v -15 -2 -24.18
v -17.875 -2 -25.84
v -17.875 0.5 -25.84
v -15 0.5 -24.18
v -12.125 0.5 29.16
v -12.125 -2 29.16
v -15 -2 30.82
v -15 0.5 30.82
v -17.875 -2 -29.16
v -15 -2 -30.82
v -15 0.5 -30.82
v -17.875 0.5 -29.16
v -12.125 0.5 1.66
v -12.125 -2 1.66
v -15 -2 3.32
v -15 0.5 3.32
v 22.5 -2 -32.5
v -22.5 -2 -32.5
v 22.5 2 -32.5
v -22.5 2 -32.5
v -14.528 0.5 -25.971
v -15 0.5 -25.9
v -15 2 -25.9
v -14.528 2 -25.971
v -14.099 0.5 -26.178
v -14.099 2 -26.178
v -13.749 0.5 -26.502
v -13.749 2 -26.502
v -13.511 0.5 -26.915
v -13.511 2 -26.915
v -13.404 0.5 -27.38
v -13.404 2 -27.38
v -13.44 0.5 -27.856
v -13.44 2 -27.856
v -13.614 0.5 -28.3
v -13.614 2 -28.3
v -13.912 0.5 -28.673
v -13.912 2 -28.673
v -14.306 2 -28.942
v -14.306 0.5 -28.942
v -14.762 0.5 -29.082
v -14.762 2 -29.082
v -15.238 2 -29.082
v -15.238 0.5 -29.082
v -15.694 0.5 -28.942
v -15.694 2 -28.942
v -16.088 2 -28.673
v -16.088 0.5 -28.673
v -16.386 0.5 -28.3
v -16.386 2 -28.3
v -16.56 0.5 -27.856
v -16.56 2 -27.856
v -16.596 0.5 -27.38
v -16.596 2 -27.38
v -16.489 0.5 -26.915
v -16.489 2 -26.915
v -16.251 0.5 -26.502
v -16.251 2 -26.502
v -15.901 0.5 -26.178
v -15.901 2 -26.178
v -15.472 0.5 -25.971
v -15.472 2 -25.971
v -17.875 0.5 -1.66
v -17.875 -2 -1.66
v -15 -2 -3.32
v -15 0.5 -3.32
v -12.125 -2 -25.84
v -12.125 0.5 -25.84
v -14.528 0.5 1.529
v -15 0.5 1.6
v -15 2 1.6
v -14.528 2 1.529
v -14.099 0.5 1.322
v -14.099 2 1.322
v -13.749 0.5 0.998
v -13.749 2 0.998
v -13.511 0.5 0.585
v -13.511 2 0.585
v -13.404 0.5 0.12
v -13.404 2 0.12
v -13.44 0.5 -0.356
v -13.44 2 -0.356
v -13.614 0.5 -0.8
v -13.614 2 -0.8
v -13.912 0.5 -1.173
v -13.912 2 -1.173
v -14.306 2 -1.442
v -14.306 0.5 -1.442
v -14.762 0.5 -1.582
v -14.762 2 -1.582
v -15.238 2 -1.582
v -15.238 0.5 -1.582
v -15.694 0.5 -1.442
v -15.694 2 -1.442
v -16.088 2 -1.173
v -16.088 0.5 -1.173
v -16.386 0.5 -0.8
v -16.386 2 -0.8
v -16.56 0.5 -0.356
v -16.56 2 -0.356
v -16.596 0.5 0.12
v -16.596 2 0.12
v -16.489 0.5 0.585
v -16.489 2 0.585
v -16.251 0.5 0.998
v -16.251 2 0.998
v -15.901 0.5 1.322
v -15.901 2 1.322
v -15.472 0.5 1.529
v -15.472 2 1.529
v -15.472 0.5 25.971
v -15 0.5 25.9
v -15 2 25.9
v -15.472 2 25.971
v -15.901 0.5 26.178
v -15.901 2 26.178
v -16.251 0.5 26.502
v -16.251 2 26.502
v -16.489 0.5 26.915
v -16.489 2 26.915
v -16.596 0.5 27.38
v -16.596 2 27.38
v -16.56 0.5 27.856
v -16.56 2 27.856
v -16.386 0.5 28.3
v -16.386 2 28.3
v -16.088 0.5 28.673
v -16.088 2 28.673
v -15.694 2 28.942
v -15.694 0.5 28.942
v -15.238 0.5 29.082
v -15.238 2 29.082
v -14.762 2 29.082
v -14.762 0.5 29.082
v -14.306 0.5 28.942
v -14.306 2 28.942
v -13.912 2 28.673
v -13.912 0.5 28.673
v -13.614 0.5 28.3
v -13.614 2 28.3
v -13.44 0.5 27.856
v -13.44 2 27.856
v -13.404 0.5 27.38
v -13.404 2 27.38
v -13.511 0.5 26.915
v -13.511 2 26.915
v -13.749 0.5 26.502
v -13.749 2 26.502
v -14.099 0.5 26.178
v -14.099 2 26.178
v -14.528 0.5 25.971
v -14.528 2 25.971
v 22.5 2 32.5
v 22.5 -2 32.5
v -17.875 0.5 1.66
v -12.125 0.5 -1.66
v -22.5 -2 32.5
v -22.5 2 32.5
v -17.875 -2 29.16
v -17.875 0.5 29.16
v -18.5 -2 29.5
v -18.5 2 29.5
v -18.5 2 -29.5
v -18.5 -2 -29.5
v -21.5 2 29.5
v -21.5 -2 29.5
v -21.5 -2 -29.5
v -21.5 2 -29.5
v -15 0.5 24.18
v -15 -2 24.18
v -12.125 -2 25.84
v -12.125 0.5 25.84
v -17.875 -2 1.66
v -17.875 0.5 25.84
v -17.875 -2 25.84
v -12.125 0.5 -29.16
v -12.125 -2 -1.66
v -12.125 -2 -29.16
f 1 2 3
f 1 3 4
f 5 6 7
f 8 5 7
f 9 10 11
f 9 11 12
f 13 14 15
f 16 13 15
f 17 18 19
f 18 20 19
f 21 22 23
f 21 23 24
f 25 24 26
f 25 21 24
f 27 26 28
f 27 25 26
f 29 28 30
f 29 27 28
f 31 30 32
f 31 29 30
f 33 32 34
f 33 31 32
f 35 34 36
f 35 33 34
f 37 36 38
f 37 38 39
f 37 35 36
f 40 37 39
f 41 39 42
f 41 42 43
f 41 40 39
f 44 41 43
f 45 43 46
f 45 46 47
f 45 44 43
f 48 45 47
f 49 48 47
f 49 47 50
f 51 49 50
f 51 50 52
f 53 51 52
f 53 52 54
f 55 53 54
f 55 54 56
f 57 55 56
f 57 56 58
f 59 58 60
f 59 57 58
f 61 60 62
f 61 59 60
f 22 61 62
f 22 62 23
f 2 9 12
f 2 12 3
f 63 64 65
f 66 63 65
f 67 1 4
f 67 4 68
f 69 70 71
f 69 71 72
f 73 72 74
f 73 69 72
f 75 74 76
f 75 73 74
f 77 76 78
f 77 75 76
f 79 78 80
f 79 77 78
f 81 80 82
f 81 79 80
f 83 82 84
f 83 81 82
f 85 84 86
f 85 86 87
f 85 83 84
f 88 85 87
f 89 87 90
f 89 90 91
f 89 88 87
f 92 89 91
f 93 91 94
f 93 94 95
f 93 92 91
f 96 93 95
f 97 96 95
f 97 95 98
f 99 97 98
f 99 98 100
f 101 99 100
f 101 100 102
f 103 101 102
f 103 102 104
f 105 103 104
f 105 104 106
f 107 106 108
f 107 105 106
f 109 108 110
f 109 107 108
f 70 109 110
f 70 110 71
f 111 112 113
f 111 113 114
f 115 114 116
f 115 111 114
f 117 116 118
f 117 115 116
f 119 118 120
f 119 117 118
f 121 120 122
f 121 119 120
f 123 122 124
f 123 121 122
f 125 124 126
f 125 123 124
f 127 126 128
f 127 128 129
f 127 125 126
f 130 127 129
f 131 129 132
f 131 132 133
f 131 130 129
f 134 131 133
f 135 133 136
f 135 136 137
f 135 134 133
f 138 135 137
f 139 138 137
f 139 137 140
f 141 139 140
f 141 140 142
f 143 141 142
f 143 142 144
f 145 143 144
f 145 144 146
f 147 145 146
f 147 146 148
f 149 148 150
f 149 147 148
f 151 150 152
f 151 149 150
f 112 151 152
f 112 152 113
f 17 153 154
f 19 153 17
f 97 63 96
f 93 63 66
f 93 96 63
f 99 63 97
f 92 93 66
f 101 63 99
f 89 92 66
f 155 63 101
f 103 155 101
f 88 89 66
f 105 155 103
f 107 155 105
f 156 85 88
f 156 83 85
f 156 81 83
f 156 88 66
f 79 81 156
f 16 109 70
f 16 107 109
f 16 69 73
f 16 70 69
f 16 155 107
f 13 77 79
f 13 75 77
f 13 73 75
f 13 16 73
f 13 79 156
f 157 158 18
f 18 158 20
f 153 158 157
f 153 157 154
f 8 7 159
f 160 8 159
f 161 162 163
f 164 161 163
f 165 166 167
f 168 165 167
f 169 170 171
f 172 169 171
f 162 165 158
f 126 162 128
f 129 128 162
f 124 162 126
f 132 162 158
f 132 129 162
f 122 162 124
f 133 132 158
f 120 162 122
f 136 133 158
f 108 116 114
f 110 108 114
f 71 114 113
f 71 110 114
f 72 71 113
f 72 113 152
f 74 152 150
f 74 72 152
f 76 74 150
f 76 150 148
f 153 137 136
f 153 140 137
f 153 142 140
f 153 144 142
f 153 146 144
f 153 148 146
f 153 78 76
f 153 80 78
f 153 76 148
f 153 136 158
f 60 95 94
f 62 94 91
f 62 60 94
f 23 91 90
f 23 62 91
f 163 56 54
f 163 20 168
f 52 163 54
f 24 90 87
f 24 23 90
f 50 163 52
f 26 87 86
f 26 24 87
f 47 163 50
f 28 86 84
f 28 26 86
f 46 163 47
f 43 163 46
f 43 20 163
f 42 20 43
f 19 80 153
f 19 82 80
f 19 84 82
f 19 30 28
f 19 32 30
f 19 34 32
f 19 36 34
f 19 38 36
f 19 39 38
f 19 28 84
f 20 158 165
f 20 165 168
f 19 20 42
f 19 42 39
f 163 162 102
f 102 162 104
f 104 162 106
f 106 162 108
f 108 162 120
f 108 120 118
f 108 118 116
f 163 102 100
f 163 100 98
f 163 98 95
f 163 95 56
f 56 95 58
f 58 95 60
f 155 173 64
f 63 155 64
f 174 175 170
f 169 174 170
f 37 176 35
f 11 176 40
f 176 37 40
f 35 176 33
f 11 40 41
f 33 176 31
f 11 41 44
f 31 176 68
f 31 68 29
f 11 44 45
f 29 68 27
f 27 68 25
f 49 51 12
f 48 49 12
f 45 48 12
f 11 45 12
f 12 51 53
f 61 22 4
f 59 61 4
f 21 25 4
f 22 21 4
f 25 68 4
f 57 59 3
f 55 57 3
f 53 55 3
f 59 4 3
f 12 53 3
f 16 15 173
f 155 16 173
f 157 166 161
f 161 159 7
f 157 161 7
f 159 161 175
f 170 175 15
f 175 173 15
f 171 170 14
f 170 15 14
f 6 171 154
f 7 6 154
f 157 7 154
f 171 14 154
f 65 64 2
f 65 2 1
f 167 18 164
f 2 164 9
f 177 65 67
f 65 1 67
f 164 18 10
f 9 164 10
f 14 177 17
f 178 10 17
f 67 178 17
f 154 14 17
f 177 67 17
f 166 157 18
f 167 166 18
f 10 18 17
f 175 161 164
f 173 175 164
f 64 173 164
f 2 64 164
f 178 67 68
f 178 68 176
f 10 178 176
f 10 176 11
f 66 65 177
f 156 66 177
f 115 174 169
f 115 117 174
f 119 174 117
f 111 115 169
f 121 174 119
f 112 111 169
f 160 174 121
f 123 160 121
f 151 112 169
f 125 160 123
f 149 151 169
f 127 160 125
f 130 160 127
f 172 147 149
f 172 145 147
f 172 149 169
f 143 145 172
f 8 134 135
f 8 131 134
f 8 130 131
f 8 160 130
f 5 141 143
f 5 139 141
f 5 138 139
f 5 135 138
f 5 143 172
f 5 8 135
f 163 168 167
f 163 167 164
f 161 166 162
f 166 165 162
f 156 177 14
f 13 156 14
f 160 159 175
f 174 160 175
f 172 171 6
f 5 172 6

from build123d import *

# Parameters (mm, degrees)
SKETCH1_W           = 45
SKETCH1_H           = 65
SKETCH1_R           = 1.6
SKETCH1_W_2         = 3
SKETCH1_H_2         = 59
BOSS_EXTRUDE1_DEPTH = 2
CUT_EXTRUDE1_DEPTH  = 2.5


with BuildPart() as part:
    # Sketch1 → Boss-Extrude1 (new, symmetric)
    with BuildSketch(Plane(origin=(0, 0, 0), x_dir=(1, 0, 0), z_dir=(0, 1, 0))):
        Rectangle(SKETCH1_W, SKETCH1_H)
        with Locations(Location((-15, 27.5, 0), (0, 0, 270))):
            Circle(SKETCH1_R, mode=Mode.SUBTRACT)
        with Locations(Location((-15, 0, 0), (0, 0, 270))):
            Circle(SKETCH1_R, mode=Mode.SUBTRACT)
        with Locations(Location((-15, -27.5, 0), (0, 0, 90))):
            Circle(SKETCH1_R, mode=Mode.SUBTRACT)
        with Locations((-20, 0)):
            Rectangle(SKETCH1_W_2, SKETCH1_H_2, mode=Mode.SUBTRACT)
    extrude(amount=BOSS_EXTRUDE1_DEPTH, both=True)

    # Sketch4 → Cut-Extrude1 (cut)
    with BuildSketch(Plane.XZ.offset(2)):
        Polygon((-15, -3.319764048), (-12.125, -1.659882024), (-12.125, 1.659882024), (-15, 3.319764048), (-17.875, 1.659882024), (-17.875, -1.659882024), align=None)
        Polygon((-17.875, -25.840117976), (-15, -24.180235952), (-12.125, -25.840117976), (-12.125, -29.159882024), (-15, -30.819764048), (-17.875, -29.159882024), align=None)
        Polygon((-15, 24.180235952), (-12.125, 25.840117976), (-12.125, 29.159882024), (-15, 30.819764048), (-17.875, 29.159882024), (-17.875, 25.840117976), align=None)
    extrude(amount=-CUT_EXTRUDE1_DEPTH, mode=Mode.SUBTRACT)


solid = part.part
